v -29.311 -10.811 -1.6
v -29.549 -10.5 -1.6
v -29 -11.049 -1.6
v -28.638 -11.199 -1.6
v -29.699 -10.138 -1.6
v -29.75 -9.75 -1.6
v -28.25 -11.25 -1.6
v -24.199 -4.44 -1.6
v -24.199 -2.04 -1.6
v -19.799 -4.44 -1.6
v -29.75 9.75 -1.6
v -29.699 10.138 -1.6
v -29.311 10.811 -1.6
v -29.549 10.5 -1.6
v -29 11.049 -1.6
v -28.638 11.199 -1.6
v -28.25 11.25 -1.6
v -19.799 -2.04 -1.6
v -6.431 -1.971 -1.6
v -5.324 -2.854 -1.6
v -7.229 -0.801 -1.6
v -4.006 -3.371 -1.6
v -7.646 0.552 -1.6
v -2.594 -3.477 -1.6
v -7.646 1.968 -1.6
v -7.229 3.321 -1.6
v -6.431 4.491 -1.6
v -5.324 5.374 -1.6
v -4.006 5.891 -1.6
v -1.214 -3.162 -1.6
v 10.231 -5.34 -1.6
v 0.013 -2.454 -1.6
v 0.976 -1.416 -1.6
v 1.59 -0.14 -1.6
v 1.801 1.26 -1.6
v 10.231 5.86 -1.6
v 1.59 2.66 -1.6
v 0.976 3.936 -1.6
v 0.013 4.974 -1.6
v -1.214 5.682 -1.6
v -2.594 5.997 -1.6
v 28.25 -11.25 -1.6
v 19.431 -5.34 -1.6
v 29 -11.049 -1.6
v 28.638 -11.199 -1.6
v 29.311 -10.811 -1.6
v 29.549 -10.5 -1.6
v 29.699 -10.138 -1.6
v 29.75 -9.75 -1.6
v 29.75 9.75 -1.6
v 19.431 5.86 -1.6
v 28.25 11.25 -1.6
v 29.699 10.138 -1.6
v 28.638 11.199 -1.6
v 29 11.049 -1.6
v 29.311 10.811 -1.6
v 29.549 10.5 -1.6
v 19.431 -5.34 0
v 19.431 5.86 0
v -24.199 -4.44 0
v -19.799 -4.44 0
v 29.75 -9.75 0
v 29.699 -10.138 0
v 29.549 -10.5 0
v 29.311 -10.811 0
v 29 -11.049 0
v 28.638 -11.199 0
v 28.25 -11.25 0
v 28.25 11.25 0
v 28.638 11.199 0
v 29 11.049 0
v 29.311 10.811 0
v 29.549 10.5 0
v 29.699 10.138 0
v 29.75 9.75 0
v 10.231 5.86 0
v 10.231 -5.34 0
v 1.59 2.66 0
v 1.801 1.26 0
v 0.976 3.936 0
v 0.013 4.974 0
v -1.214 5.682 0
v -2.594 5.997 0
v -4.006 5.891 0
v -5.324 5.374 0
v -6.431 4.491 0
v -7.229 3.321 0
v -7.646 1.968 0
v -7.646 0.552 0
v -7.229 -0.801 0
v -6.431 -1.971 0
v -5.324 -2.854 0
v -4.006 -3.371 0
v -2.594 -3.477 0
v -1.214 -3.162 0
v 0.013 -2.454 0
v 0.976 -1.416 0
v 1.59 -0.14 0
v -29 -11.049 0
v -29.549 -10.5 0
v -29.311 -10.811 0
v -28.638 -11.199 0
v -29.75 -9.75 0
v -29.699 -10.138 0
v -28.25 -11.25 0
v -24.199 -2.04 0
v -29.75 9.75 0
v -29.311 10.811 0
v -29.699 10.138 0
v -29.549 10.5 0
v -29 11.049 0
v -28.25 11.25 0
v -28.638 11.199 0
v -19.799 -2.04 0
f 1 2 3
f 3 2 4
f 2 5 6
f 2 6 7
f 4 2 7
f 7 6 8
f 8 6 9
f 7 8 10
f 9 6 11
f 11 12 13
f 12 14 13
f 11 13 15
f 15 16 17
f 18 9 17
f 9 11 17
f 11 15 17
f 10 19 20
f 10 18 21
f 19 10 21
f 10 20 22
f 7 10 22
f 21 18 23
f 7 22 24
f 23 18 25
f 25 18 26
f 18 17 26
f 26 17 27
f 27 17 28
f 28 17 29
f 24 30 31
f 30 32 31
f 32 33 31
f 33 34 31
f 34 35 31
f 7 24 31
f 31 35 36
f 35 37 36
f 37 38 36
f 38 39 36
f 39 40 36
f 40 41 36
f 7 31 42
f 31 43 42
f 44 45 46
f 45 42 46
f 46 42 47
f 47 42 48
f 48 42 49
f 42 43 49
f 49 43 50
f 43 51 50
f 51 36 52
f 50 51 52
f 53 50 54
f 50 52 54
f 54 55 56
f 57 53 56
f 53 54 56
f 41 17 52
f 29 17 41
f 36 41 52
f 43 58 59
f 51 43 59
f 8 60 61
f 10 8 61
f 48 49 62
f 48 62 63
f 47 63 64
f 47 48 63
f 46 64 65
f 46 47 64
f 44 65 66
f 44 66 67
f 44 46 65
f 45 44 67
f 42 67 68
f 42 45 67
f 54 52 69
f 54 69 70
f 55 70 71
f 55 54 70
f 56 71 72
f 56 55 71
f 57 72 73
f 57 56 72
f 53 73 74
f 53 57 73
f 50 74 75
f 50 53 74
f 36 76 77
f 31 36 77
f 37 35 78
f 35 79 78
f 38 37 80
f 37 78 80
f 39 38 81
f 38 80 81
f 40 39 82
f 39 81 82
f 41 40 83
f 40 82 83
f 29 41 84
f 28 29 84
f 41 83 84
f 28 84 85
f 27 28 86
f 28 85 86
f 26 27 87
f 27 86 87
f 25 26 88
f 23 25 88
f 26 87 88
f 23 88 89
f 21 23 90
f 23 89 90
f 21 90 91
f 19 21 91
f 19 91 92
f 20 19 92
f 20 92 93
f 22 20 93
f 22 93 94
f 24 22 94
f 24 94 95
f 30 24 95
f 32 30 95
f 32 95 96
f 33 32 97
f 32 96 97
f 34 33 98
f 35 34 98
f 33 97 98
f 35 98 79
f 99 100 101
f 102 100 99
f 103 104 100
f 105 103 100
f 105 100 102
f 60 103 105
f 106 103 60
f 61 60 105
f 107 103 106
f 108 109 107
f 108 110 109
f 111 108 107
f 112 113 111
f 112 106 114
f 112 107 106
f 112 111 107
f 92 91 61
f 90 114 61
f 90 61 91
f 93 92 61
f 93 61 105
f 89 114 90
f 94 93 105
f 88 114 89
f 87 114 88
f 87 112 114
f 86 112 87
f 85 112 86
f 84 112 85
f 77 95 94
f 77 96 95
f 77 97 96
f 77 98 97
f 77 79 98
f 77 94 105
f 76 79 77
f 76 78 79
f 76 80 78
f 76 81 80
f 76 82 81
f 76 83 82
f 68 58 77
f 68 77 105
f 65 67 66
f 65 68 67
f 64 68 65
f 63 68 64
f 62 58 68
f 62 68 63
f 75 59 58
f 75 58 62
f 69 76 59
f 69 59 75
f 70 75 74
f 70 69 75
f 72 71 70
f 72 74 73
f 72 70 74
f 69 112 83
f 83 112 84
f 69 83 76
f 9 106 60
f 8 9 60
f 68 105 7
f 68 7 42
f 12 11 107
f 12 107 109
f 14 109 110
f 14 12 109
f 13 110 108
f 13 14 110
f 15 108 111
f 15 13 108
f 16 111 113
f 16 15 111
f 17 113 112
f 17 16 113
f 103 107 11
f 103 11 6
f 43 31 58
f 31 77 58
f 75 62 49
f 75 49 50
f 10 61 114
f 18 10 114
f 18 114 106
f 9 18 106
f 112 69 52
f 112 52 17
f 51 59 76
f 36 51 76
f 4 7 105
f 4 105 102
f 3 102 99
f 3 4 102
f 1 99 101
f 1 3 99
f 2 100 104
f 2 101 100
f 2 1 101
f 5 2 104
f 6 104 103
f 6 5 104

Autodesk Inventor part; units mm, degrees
ref_plane "YZ Plane" through (0, 0, 0) normal (1, 0, 0) x (0, 1, 0)
ref_plane "XZ Plane" through (0, 0, 0) normal (0, 1, 0) x (-1, 0, 0)
ref_plane "XY Plane" through (0, 0, 0) normal (0, 0, 1) x (1, 0, 0)
sketch "Sketch1" plane through (0, 0, 0) normal (0, 0, 1) x (1, 0, 0)
  line L0 (-29.75, -11.25) -> (29.75, -11.25)
  line L1 (29.75, -11.25) -> (29.75, 11.25)
  line L2 (29.75, 11.25) -> (-29.75, 11.25)
  line L3 (-29.75, 11.25) -> (-29.75, -11.25)
  line L4 (-29.75, -11.25) -> (29.75, 11.25) construction
  line L5 (29.75, -11.25) -> (-29.75, 11.25) construction
  point P0 (0, 0)
  dimension "d0" = 59.5
  dimension "d1" = 22.5
extrude "Extrusion1" add sketch "Sketch1" against normal blind 1.6
fillet "Fillet1" radius 1.5 4 edges at (29.75, 11.25, -0.8) (29.75, -11.25, -0.8) (-29.75, 11.25, -0.8) (-29.75, -11.25, -0.8)
sketch "Sketch2" plane through (0, 0, 0) normal (0, 0, 1) x (1, 0, 0)
  circle A0 centre (-2.949, 1.26) radius 4.75
  line L0 (-28.25, -11.25) -> (28.25, -11.25) projected
  line L1 (-29.75, 9.75) -> (-29.75, -9.75) projected
  line L2 (-24.199, -4.44) -> (-19.799, -4.44)
  line L3 (-19.799, -4.44) -> (-19.799, -2.04)
  line L4 (-19.799, -2.04) -> (-24.199, -2.04)
  line L5 (-24.199, -2.04) -> (-24.199, -4.44)
  line L6 (-24.199, -4.44) -> (-19.799, -2.04) construction
  line L7 (-19.799, -4.44) -> (-24.199, -2.04) construction
  point P0 (0, 0)
  point P1 (-28.349, -5.24)
  point P2 (-21.999, -3.24)
  dimension "d5" = 9.5
  dimension "d15" = 12.51
  dimension "d16" = 26.801
  dimension "d17" = 6.01
  dimension "d18" = 1.401
  dimension "d19" = 4.4
  dimension "d20" = 2.4
  dimension "d21" = 6.35
  dimension "d22" = 2
extrude "Extrusion2" cut sketch "Sketch2" against normal through all
sketch "Sketch4" plane through (0, 0, 0) normal (0, 0, 1) x (1, 0, 0)
  line L0 (-28.25, -11.25) -> (28.25, -11.25) projected
  line L1 (-29.75, 9.75) -> (-29.75, -9.75) projected
  line L2 (10.231, -5.34) -> (19.431, -5.34)
  line L3 (19.431, -5.34) -> (19.431, 5.86)
  line L4 (19.431, 5.86) -> (10.231, 5.86)
  line L5 (10.231, 5.86) -> (10.231, -5.34)
  line L6 (10.231, -5.34) -> (19.431, 5.86) construction
  line L7 (19.431, -5.34) -> (10.231, 5.86) construction
  point P0 (0, 0)
  point P1 (-28.349, -5.24)
  point P2 (14.831, 0.26)
  dimension "d23" = 6.01
  dimension "d24" = 1.401
  dimension "d25" = 9.2
  dimension "d26" = 11.2
  dimension "d28" = 43.18
  dimension "d29" = 0.1
extrude "Extrusion4" cut sketch "Sketch4" against normal through all
properties part number "rearPlate_jack"
